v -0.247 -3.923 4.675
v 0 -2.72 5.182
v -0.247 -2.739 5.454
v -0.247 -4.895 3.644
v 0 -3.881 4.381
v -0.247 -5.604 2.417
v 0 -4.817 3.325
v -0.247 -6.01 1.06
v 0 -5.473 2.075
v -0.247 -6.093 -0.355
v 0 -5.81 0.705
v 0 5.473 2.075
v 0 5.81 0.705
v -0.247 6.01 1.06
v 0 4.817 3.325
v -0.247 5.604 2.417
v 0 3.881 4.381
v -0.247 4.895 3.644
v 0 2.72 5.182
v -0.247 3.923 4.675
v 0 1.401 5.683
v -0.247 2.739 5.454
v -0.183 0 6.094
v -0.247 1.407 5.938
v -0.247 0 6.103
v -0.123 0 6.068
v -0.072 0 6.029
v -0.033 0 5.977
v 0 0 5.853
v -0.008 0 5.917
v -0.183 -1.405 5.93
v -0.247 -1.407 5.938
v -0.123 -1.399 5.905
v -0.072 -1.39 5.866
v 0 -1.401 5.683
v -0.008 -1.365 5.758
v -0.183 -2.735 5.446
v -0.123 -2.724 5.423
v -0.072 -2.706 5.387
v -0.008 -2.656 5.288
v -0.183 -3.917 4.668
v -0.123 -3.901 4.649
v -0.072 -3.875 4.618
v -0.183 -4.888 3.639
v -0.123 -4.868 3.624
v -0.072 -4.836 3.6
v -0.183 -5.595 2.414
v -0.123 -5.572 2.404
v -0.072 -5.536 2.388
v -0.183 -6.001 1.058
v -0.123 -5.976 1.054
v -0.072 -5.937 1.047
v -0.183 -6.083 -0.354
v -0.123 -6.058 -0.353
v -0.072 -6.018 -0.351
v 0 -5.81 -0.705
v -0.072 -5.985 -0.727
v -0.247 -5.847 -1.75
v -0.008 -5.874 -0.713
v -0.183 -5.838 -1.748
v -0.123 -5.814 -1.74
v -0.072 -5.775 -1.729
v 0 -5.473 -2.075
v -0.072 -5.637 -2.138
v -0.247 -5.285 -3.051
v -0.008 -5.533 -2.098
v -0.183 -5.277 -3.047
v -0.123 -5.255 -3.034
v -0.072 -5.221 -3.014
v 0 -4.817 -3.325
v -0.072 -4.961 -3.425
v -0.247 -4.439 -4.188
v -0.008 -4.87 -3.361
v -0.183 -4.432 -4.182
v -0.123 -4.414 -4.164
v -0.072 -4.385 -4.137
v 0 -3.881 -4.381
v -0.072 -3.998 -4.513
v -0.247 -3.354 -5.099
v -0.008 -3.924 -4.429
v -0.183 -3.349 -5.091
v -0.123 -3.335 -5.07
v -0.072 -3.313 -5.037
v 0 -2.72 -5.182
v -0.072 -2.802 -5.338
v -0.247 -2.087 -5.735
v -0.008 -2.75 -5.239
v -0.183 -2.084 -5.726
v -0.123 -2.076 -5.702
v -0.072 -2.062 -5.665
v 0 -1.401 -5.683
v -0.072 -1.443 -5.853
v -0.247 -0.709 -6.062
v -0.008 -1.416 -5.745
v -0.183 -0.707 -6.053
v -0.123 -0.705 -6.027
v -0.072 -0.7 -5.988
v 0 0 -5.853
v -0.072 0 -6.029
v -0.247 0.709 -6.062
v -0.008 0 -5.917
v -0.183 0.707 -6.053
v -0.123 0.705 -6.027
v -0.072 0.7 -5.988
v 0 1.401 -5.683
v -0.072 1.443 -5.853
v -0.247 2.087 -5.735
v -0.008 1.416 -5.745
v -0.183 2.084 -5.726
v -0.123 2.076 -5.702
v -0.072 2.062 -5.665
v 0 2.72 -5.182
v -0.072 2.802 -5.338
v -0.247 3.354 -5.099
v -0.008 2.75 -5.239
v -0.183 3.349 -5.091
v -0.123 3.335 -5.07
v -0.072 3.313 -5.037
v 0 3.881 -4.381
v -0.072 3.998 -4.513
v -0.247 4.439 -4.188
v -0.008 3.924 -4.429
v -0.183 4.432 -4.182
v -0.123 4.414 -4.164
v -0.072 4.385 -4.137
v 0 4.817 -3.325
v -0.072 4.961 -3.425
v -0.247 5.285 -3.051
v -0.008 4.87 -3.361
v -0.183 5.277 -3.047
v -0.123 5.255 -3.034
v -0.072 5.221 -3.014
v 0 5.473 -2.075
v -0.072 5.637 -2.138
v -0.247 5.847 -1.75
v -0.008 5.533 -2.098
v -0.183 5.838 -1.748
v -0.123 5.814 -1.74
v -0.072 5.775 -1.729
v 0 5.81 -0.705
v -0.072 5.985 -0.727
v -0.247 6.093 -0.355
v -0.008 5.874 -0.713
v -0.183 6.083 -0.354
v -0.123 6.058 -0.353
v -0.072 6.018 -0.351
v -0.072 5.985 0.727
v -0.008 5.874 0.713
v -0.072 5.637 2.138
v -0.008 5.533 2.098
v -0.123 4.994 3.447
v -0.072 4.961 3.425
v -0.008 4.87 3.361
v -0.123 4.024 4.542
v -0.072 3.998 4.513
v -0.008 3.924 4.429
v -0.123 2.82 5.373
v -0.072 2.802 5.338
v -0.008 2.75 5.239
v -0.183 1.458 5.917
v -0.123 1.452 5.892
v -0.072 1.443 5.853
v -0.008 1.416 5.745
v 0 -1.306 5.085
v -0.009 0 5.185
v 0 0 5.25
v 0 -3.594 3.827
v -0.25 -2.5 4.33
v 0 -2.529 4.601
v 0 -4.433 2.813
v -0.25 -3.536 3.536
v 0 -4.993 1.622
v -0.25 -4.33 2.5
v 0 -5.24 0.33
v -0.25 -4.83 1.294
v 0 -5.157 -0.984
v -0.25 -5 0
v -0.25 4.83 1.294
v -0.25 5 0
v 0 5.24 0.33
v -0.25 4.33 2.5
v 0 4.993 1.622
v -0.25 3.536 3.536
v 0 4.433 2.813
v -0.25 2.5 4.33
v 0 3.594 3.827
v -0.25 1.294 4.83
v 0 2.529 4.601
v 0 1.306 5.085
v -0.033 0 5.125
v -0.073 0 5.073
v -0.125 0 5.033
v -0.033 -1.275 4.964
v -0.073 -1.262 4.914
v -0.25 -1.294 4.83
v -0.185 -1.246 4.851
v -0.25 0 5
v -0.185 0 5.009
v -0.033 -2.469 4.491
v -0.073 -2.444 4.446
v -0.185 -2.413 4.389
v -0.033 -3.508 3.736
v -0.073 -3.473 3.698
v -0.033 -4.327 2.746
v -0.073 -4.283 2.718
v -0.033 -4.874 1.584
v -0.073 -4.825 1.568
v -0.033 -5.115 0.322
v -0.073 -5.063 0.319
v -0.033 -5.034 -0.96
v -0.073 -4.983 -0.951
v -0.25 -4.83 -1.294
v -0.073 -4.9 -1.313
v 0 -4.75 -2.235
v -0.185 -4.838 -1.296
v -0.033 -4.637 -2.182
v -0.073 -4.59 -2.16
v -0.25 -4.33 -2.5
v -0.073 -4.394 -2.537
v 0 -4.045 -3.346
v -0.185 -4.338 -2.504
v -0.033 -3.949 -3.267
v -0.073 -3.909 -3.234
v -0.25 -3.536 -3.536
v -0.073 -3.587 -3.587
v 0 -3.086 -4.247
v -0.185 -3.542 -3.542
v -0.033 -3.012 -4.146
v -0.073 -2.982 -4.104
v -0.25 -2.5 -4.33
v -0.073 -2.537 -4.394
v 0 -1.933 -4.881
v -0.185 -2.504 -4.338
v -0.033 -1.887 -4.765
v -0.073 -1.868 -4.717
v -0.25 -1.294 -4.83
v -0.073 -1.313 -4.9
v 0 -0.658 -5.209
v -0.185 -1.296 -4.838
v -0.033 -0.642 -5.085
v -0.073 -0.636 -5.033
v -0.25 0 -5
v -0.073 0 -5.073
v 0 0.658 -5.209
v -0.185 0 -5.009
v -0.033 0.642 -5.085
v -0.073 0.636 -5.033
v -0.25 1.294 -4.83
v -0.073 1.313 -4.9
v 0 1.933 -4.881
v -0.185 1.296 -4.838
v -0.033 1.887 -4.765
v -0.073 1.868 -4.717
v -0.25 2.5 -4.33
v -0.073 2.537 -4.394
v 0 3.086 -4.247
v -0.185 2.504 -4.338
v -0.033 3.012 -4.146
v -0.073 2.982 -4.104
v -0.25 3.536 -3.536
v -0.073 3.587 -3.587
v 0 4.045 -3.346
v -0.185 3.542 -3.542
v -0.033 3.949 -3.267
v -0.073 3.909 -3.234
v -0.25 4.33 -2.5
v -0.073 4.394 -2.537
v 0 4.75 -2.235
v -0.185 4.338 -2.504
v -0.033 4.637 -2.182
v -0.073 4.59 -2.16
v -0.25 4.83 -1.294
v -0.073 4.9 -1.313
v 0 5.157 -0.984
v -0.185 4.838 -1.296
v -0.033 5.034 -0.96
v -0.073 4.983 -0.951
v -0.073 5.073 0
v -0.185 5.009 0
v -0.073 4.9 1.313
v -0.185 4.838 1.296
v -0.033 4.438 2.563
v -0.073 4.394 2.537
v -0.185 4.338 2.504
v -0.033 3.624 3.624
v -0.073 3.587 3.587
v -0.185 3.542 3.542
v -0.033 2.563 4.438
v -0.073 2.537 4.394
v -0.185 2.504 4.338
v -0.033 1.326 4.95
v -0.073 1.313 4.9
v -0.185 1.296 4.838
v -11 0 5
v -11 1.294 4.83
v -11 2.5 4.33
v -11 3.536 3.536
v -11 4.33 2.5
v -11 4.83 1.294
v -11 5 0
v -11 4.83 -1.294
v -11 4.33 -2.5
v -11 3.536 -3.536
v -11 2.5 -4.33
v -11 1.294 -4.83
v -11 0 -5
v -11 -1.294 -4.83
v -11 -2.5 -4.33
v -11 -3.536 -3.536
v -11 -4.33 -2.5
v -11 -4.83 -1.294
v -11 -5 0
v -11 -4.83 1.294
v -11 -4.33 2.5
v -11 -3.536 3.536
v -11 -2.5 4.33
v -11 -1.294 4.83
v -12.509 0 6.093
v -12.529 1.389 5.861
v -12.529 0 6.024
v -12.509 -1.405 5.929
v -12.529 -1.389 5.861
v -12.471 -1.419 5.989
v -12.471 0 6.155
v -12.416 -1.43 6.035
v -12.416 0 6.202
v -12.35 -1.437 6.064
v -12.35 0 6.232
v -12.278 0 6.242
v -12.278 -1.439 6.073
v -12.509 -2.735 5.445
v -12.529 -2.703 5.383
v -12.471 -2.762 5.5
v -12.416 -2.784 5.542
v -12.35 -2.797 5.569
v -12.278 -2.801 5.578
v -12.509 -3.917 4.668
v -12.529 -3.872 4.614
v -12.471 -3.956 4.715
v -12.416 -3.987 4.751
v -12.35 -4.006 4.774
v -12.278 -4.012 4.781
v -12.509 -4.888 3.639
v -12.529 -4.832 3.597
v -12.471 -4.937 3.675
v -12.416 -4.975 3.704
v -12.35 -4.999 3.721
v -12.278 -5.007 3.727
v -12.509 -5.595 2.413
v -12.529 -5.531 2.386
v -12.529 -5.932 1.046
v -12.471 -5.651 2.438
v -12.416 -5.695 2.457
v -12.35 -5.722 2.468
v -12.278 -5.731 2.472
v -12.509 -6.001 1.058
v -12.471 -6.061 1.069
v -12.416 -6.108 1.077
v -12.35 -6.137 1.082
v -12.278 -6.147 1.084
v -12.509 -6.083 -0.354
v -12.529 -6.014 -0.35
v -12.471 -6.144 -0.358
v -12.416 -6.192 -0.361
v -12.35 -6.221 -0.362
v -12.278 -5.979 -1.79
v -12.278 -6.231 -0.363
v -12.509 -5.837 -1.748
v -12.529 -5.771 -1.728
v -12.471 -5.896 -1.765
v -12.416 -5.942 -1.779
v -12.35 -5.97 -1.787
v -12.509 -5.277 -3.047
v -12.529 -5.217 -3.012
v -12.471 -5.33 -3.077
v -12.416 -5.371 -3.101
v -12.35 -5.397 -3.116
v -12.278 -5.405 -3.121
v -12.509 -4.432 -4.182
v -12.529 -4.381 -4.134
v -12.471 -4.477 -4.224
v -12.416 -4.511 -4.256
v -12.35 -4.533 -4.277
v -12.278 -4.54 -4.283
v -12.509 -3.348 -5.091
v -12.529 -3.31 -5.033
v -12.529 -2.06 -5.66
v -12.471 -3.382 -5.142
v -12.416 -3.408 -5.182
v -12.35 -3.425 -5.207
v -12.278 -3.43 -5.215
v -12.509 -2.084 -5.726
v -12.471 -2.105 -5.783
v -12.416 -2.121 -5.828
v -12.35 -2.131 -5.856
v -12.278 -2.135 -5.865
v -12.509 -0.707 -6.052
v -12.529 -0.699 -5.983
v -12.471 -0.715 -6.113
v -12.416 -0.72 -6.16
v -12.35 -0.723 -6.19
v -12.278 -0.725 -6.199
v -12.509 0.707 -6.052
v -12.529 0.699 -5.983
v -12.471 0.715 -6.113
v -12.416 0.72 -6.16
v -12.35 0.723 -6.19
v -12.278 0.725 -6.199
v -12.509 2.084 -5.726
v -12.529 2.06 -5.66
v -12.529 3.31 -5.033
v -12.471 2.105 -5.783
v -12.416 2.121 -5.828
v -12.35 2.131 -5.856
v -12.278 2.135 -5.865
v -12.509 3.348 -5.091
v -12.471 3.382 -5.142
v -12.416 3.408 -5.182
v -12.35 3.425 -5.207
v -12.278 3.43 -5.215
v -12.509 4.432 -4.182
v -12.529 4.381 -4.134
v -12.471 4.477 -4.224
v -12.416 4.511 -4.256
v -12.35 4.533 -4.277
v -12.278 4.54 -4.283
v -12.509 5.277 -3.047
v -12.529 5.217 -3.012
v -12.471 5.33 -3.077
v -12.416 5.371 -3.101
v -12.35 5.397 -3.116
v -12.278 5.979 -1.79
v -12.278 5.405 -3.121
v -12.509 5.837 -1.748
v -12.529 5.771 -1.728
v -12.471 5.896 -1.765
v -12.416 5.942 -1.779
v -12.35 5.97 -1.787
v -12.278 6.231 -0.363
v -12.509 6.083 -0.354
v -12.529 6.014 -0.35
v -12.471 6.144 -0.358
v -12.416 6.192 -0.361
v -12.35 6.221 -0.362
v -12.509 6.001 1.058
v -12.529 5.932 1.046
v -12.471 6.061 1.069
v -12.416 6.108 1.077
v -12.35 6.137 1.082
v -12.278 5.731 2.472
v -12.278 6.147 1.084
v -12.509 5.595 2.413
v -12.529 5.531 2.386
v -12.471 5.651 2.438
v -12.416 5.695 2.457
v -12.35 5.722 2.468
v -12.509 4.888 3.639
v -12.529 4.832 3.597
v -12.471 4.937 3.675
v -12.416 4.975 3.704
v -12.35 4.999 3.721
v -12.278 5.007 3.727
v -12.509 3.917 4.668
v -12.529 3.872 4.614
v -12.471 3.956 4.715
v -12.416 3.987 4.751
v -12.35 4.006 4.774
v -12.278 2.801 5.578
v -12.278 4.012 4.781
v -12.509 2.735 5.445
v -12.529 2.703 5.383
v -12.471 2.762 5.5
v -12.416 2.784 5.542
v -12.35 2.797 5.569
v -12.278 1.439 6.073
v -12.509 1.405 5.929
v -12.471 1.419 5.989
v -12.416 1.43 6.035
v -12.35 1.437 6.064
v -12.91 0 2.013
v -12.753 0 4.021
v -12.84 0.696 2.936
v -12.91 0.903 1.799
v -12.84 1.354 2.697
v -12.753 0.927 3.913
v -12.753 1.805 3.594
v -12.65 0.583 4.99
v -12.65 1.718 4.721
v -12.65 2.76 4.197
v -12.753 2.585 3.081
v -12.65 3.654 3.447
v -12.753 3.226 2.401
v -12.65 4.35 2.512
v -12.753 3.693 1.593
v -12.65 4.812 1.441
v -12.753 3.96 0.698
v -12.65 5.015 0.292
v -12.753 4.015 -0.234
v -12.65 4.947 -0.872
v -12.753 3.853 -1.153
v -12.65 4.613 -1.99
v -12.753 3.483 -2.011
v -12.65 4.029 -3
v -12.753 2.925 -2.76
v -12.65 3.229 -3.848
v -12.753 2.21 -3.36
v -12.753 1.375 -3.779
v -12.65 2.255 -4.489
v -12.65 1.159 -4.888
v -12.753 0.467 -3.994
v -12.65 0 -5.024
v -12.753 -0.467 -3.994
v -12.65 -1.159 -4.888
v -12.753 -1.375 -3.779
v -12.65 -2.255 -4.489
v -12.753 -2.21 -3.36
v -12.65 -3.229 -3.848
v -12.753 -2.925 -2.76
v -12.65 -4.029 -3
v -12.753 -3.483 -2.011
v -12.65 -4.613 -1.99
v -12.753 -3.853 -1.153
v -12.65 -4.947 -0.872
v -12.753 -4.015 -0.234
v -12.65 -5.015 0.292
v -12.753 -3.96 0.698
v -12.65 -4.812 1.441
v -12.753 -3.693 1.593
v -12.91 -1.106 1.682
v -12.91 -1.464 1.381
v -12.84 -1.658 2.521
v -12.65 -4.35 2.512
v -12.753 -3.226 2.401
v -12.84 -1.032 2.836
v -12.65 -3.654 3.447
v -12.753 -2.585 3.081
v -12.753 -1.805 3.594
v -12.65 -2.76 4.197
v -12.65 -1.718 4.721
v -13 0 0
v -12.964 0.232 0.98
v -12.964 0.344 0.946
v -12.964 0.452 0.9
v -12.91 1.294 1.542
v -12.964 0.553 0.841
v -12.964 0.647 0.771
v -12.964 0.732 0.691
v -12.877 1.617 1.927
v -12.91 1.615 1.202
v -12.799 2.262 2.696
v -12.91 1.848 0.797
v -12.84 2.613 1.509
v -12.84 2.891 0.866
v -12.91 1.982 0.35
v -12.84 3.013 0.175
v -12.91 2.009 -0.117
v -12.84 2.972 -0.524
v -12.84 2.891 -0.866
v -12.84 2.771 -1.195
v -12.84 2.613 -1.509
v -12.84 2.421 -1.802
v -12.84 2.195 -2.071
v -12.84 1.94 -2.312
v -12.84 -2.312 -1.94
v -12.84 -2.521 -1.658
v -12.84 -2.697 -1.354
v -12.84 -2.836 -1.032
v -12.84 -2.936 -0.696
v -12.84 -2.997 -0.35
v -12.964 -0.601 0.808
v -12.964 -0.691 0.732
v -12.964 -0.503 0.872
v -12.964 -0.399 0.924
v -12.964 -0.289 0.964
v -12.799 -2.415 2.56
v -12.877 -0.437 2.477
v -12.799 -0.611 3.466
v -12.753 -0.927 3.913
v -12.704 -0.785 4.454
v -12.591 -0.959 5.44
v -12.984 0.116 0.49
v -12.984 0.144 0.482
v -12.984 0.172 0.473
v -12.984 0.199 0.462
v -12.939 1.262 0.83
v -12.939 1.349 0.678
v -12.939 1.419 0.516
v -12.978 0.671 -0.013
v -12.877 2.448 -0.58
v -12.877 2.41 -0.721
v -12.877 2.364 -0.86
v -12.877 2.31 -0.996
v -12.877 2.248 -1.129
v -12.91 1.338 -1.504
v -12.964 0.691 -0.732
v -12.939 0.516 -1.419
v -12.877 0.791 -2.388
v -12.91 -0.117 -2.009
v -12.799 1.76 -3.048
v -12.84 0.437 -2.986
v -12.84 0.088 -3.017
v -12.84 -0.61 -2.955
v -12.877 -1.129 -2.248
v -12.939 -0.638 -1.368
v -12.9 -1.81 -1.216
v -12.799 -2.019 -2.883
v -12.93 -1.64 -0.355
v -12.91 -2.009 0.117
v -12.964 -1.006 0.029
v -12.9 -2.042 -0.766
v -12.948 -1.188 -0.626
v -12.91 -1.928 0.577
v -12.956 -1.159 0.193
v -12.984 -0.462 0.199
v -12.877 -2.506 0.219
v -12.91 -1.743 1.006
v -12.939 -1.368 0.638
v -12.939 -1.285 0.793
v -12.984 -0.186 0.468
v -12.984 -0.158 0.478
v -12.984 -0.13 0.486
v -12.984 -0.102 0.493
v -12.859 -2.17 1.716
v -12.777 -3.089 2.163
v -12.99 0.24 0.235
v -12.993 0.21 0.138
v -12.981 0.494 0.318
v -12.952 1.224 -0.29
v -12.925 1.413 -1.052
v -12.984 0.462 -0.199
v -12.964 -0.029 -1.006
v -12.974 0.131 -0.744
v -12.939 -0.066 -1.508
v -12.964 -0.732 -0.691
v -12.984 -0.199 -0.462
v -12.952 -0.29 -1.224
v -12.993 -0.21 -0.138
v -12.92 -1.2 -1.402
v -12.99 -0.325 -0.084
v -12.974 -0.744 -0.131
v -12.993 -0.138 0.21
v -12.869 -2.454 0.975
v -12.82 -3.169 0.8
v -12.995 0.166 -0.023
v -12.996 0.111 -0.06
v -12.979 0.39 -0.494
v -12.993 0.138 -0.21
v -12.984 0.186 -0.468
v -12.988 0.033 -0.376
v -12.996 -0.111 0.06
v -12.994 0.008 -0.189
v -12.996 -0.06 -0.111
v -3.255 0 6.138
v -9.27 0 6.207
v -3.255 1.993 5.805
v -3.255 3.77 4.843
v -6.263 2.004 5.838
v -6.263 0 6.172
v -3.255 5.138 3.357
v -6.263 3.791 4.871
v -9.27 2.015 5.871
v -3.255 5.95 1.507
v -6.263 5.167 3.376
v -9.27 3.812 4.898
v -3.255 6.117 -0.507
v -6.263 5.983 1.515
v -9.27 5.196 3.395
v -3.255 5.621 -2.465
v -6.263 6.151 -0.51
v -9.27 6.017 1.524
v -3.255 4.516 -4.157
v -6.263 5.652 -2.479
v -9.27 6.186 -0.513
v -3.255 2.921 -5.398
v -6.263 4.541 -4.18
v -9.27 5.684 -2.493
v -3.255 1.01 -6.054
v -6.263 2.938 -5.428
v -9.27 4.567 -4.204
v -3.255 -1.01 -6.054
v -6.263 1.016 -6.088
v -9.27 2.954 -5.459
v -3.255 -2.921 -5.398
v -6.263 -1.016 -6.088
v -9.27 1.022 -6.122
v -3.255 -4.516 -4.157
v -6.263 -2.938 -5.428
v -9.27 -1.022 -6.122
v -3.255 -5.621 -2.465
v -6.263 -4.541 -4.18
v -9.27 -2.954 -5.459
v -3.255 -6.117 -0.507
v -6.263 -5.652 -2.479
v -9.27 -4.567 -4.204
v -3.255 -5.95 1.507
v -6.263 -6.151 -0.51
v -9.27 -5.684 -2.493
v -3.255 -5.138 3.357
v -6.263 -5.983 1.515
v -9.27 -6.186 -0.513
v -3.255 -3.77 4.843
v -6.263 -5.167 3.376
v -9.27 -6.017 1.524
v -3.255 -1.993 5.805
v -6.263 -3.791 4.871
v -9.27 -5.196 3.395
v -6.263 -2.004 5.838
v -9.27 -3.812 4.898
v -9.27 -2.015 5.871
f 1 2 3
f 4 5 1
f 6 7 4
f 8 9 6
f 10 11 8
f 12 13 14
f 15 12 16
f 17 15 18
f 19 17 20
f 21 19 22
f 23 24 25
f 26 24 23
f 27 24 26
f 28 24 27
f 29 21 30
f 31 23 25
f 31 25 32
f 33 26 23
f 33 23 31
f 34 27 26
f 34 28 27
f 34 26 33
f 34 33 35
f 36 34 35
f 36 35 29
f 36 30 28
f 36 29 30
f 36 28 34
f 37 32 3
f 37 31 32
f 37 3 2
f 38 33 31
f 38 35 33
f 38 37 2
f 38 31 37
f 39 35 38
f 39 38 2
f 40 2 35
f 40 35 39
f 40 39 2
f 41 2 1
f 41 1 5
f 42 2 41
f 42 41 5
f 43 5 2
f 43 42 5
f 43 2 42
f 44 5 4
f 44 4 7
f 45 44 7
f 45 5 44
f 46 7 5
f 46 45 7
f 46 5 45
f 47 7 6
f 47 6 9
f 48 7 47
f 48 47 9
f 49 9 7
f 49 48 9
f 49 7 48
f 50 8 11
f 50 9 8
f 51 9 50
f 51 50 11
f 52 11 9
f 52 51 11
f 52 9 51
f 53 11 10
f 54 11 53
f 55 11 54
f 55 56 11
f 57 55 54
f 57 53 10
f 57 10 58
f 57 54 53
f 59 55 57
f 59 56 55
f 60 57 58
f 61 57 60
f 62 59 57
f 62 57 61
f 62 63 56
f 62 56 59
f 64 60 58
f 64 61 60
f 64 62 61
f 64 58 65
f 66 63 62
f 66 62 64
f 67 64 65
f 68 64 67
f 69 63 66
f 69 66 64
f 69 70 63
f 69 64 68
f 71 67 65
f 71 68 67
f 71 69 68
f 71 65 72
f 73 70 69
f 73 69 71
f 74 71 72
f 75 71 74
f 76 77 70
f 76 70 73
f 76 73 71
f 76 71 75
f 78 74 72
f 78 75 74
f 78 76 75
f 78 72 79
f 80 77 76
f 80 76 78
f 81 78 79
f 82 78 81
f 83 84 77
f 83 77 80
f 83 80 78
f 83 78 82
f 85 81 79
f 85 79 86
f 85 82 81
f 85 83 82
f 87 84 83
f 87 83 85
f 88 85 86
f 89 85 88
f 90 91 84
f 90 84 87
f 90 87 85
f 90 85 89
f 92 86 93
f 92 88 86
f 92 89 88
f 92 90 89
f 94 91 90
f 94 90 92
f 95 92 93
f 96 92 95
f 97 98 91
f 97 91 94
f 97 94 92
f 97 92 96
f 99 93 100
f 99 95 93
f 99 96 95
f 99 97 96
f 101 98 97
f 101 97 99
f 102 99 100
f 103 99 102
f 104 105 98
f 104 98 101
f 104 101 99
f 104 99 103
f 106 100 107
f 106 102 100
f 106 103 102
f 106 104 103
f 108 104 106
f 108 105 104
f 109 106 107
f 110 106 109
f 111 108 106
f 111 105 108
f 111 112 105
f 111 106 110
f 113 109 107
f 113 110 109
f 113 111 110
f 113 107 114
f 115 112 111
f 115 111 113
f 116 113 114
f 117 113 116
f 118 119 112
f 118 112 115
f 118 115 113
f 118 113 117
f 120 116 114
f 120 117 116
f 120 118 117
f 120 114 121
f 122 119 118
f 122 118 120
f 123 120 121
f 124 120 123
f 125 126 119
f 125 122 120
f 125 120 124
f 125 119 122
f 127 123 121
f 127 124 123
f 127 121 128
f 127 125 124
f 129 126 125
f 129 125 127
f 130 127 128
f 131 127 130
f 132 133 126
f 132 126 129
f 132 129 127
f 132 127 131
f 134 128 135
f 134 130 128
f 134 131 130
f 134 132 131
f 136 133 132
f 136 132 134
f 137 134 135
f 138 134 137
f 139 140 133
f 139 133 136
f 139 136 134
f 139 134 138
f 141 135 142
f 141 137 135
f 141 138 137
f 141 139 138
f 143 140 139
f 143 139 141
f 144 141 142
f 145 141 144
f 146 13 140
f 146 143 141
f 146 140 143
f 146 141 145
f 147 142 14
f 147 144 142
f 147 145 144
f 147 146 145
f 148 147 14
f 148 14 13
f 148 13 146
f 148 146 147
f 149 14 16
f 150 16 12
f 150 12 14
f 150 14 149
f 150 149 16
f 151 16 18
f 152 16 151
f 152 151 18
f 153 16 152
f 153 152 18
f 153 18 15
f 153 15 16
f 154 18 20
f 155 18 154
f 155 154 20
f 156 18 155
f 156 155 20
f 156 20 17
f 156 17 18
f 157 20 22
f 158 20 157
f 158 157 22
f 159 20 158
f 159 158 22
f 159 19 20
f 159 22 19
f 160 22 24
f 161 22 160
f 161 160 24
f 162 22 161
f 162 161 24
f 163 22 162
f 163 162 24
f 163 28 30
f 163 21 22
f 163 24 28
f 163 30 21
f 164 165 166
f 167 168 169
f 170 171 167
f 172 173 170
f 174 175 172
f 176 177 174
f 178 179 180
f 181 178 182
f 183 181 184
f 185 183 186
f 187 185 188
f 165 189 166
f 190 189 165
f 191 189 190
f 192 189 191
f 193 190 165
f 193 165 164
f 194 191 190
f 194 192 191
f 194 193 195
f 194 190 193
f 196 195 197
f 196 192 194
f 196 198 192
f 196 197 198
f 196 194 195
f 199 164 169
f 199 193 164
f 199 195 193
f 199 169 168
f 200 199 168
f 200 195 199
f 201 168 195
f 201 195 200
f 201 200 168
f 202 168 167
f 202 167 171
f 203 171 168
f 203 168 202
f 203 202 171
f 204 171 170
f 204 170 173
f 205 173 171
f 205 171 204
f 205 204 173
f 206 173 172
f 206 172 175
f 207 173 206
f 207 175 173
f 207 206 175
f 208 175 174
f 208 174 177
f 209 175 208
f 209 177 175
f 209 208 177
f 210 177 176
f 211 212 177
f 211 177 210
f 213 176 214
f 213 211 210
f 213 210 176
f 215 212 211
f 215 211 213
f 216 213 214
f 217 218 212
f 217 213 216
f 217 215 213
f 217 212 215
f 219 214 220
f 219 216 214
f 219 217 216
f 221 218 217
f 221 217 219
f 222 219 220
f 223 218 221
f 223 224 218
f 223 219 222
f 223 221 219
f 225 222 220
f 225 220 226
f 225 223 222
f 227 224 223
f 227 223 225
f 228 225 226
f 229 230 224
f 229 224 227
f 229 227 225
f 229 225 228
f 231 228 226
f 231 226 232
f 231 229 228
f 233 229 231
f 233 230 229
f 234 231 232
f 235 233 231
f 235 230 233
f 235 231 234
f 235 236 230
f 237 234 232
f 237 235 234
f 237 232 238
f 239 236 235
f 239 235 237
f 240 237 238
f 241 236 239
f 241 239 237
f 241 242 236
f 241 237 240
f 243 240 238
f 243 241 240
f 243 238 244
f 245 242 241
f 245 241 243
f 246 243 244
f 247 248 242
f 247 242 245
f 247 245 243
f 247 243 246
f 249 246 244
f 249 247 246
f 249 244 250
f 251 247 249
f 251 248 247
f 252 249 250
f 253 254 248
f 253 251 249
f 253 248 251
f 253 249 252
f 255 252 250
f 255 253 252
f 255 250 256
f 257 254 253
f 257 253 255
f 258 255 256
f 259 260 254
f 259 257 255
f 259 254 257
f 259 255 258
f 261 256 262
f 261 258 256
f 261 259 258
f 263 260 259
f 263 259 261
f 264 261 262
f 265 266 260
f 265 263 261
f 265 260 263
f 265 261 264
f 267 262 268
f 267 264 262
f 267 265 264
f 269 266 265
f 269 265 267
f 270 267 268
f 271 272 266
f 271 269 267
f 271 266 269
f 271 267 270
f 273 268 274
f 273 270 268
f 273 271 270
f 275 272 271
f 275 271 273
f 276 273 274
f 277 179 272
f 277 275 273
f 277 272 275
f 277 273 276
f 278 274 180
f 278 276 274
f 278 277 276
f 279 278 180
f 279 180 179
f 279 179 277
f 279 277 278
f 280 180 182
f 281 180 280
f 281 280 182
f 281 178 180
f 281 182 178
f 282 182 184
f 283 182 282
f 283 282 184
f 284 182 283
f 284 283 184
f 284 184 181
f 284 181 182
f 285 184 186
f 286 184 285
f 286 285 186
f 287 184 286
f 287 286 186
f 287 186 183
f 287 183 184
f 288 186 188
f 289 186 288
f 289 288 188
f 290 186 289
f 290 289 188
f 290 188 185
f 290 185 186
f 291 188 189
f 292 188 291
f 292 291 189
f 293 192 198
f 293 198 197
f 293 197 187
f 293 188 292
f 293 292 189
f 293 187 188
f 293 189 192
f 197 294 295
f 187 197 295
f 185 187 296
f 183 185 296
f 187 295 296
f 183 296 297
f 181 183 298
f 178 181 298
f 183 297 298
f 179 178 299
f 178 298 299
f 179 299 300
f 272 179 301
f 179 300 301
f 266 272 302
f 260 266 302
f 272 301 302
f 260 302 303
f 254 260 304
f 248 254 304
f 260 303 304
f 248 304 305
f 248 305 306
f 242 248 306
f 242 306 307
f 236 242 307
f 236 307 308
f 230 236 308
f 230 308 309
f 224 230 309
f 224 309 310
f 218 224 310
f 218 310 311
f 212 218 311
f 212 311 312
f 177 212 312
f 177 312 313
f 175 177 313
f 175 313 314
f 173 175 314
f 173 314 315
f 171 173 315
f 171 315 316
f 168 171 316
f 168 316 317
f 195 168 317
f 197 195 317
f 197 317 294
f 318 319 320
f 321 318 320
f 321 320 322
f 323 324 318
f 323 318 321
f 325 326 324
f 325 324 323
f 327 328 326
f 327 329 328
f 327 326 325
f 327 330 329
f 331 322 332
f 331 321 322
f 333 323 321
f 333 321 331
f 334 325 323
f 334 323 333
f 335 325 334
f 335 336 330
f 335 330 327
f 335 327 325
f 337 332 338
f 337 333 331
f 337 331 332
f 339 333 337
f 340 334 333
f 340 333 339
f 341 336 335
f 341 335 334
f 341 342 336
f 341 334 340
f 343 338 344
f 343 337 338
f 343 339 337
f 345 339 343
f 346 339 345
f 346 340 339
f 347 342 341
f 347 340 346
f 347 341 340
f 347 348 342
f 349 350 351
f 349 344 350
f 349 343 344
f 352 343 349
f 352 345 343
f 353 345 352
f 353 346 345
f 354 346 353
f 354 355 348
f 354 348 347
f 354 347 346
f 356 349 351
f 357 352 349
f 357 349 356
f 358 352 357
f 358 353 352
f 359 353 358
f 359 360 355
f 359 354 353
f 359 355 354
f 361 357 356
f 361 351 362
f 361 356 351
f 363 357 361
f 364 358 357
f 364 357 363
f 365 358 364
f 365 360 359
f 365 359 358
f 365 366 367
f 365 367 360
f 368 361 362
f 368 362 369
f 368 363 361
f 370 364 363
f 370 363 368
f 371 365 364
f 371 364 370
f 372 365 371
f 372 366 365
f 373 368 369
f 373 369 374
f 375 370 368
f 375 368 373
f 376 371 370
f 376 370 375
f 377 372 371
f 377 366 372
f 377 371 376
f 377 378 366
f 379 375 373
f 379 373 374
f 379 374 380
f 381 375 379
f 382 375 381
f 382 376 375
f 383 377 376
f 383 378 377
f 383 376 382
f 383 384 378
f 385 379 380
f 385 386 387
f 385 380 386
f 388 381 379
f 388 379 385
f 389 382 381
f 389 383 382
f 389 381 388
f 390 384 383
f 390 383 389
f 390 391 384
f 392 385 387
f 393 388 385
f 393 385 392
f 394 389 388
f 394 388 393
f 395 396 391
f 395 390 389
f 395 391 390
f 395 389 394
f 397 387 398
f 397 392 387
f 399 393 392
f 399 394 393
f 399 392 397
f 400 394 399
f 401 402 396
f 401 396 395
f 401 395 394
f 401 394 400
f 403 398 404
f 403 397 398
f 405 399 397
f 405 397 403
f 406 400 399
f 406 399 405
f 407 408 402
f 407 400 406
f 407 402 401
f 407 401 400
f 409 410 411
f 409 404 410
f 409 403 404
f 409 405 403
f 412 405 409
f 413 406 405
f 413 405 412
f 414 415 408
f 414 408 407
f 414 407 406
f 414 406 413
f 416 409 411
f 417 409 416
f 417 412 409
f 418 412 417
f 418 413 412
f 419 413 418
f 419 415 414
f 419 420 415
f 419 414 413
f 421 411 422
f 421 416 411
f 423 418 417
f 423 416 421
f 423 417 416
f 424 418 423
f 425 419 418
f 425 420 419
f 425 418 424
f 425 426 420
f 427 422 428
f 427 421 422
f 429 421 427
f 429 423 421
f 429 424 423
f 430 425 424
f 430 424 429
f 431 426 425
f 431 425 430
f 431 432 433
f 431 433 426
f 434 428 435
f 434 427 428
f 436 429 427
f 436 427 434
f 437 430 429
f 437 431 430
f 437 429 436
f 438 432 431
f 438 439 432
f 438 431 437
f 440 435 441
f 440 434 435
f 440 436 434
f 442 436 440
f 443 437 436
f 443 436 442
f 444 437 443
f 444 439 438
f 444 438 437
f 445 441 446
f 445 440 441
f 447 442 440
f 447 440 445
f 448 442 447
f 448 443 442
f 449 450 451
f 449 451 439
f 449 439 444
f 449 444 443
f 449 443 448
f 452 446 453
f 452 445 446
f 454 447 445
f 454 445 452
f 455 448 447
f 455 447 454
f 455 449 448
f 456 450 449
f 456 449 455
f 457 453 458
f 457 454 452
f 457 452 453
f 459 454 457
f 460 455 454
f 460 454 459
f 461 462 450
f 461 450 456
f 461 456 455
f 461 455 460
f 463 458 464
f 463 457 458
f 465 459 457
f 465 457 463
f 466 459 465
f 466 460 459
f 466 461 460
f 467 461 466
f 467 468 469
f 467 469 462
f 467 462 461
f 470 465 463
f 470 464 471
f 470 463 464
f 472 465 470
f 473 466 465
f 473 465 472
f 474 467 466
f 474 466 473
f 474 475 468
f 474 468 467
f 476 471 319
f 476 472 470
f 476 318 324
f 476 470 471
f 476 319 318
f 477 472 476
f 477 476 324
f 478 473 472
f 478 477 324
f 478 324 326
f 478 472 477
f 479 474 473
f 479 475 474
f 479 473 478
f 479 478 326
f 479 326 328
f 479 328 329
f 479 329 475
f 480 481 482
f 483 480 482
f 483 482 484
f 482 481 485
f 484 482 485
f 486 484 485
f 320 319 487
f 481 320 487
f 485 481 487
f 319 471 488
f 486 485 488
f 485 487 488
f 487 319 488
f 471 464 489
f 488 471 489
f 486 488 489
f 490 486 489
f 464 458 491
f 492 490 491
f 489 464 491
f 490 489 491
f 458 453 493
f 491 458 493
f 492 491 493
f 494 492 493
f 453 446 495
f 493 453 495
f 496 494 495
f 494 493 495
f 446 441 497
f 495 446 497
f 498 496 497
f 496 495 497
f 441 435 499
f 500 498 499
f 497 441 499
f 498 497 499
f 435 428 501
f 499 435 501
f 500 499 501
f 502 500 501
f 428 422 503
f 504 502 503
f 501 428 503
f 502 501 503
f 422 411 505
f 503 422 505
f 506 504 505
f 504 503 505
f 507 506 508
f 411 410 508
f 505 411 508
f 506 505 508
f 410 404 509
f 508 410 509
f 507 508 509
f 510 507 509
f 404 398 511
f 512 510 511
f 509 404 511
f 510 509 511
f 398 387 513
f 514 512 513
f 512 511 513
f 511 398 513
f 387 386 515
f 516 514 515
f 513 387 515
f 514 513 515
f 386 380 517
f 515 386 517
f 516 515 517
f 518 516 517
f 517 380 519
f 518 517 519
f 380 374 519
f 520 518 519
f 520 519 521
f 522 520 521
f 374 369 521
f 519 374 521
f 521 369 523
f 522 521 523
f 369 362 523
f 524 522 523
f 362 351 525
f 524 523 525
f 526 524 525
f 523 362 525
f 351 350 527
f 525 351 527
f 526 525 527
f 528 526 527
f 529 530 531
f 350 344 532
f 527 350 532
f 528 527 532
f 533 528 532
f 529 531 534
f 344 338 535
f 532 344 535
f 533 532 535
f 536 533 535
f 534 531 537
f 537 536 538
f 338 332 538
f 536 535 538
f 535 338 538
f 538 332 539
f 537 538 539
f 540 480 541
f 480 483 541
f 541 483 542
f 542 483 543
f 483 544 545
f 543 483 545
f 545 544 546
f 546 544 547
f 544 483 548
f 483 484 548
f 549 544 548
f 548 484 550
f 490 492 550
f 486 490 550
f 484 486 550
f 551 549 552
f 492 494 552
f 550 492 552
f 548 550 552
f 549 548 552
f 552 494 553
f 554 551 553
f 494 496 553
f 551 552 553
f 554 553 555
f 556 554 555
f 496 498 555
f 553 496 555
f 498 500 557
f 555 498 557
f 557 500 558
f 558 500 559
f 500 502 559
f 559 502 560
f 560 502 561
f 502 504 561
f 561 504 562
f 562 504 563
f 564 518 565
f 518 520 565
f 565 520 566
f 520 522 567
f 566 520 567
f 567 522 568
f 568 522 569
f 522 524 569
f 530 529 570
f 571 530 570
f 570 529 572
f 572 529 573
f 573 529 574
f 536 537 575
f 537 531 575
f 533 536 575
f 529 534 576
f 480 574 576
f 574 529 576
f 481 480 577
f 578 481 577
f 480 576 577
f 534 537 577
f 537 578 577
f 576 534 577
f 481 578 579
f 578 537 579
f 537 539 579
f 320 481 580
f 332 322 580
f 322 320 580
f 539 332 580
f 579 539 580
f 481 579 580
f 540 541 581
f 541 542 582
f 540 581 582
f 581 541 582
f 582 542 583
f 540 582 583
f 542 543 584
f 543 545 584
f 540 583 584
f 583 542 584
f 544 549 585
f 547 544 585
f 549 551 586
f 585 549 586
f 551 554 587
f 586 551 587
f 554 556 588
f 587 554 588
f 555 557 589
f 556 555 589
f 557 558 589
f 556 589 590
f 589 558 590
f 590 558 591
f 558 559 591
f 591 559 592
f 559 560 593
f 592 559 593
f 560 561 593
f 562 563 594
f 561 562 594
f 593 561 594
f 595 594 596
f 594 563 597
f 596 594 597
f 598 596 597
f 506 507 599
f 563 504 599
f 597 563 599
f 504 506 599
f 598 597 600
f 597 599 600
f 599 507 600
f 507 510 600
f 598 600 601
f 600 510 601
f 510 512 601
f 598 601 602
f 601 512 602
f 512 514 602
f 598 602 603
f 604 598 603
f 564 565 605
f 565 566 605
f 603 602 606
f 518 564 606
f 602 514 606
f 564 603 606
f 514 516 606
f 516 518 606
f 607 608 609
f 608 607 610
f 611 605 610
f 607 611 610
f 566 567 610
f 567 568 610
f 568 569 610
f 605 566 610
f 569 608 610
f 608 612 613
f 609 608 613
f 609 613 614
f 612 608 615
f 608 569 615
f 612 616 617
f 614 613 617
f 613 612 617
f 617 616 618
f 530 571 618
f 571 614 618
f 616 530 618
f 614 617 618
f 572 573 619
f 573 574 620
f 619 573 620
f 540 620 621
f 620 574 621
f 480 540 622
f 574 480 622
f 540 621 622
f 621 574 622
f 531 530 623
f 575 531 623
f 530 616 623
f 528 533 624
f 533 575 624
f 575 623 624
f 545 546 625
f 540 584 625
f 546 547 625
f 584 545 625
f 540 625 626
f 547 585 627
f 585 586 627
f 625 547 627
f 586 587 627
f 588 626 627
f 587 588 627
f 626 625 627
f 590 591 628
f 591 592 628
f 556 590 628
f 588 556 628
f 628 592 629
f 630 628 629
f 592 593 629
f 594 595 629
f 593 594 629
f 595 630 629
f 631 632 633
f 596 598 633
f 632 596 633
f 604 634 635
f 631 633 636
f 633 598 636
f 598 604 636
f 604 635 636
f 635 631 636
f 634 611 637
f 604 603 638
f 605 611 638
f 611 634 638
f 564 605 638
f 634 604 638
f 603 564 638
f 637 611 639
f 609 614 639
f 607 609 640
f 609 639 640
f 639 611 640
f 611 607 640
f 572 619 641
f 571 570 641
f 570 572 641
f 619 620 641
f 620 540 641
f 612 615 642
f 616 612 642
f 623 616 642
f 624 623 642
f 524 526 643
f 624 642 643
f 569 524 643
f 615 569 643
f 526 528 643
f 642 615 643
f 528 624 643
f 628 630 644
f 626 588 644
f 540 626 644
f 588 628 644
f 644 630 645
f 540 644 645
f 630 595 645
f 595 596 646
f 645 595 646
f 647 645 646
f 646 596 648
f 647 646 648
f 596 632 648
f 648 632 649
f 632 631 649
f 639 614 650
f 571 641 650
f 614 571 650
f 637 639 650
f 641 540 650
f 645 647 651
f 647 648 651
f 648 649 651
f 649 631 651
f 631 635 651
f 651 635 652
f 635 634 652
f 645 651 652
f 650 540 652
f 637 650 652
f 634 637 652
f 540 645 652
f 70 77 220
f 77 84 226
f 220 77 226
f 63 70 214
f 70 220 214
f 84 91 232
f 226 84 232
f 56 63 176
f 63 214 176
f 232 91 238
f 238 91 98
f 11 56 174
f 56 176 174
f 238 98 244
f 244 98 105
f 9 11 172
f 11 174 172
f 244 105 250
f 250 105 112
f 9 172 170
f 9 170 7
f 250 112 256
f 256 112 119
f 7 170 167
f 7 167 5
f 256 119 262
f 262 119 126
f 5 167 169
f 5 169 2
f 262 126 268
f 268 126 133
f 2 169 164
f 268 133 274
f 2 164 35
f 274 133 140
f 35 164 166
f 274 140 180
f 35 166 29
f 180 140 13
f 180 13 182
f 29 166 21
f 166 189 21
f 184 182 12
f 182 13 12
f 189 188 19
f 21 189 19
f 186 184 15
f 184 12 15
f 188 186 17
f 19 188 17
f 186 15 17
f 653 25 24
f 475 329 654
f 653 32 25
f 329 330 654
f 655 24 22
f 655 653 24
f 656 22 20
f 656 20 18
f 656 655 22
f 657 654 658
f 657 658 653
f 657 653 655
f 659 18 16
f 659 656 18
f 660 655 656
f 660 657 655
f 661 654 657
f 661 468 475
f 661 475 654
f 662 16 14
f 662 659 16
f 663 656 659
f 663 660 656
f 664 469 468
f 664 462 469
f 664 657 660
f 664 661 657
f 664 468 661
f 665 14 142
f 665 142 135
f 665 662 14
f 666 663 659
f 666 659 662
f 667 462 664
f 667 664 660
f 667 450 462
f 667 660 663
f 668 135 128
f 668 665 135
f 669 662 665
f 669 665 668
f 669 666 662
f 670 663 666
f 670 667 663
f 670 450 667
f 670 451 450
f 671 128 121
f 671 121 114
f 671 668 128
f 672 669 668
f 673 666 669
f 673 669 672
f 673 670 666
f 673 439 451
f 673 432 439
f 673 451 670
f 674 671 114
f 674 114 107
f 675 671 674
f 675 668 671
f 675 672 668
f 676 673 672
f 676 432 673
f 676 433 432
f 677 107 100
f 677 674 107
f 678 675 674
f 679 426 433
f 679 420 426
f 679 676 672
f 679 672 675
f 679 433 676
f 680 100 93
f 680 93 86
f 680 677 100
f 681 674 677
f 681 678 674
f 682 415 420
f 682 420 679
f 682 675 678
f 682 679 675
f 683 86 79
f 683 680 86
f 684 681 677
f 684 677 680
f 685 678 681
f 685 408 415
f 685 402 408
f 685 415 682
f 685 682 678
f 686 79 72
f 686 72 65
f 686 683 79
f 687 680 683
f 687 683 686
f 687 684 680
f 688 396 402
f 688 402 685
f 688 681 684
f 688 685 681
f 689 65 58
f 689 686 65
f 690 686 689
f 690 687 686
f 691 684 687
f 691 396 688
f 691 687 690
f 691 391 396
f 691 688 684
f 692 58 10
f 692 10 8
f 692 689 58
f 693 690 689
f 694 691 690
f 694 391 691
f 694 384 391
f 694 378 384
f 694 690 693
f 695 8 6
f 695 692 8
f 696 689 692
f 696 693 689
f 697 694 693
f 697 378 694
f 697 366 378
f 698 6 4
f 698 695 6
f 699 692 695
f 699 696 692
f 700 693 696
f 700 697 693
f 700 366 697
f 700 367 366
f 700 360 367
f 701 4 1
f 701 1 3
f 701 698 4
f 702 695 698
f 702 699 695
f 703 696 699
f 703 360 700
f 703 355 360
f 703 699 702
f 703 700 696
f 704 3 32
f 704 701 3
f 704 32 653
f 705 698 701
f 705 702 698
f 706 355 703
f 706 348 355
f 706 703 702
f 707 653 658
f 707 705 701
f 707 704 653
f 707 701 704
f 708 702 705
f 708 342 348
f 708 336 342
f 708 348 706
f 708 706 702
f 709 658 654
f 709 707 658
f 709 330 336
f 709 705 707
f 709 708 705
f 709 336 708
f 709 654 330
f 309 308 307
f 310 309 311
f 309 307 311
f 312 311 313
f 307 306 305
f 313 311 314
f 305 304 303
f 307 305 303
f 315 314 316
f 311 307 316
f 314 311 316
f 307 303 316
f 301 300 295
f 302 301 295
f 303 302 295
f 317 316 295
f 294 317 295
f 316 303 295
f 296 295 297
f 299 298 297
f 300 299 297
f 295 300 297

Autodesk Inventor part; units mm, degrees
ref_plane "YZ Plane" through (0, 0, 0) normal (1, 0, 0) x (0, 1, 0)
ref_plane "XZ Plane" through (0, 0, 0) normal (0, 1, 0) x (-1, 0, 0)
ref_plane "XY Plane" through (0, 0, 0) normal (0, 0, 1) x (1, 0, 0)
sketch "Sketch1" plane through (0, 0, 0) normal (0, 1, 0) x (-1, 0, 0)
  line L0 (0, 0) -> (13, 0) construction
  line L1 (0.25, 5) -> (11, 5)
  line L2 (11, 5) -> (11, 0)
  line L3 (0, 5.25) -> (0, 5.8529)
  line L4 (13, 0) -> (13, 6.25) construction
  line L5 (12.2781, 6.2417) -> (0.2471, 6.1029)
  arc A0 (13, 0) -> (12.5289, 6.0237) centre (-46.977, -1.6605) ccw
  arc A1 (0.2471, 6.1029) -> (0, 5.8529) centre (0.25, 5.8529) ccw
  arc A2 (0, 5.25) -> (0.25, 5) centre (0.25, 5.25) ccw
  arc A3 (12.5289, 6.0237) -> (12.2781, 6.2417) centre (12.281, 5.9917) ccw
  line L6 (13, 0) -> (11, 0)
  point P0 (0, 5)
  point P1 (0, 6.1)
  point P2 (12.5, 6.2442)
  dimension "d0" = 13
  dimension "d1" = 11
  dimension "d2" = 5
  dimension "d3" = 1.1
  dimension "d5" = 2
  dimension "d6" = 6.25
  dimension "d7" = 60
  dimension "d8" = 0.5
  dimension "d9" = 0.25
revolve "Revolution1" add sketch "Sketch1" angle 360 about axis through (0, 0, 0) along (-1, 0, 0)
properties part number "10mm_Endcap" material "Rubber"
